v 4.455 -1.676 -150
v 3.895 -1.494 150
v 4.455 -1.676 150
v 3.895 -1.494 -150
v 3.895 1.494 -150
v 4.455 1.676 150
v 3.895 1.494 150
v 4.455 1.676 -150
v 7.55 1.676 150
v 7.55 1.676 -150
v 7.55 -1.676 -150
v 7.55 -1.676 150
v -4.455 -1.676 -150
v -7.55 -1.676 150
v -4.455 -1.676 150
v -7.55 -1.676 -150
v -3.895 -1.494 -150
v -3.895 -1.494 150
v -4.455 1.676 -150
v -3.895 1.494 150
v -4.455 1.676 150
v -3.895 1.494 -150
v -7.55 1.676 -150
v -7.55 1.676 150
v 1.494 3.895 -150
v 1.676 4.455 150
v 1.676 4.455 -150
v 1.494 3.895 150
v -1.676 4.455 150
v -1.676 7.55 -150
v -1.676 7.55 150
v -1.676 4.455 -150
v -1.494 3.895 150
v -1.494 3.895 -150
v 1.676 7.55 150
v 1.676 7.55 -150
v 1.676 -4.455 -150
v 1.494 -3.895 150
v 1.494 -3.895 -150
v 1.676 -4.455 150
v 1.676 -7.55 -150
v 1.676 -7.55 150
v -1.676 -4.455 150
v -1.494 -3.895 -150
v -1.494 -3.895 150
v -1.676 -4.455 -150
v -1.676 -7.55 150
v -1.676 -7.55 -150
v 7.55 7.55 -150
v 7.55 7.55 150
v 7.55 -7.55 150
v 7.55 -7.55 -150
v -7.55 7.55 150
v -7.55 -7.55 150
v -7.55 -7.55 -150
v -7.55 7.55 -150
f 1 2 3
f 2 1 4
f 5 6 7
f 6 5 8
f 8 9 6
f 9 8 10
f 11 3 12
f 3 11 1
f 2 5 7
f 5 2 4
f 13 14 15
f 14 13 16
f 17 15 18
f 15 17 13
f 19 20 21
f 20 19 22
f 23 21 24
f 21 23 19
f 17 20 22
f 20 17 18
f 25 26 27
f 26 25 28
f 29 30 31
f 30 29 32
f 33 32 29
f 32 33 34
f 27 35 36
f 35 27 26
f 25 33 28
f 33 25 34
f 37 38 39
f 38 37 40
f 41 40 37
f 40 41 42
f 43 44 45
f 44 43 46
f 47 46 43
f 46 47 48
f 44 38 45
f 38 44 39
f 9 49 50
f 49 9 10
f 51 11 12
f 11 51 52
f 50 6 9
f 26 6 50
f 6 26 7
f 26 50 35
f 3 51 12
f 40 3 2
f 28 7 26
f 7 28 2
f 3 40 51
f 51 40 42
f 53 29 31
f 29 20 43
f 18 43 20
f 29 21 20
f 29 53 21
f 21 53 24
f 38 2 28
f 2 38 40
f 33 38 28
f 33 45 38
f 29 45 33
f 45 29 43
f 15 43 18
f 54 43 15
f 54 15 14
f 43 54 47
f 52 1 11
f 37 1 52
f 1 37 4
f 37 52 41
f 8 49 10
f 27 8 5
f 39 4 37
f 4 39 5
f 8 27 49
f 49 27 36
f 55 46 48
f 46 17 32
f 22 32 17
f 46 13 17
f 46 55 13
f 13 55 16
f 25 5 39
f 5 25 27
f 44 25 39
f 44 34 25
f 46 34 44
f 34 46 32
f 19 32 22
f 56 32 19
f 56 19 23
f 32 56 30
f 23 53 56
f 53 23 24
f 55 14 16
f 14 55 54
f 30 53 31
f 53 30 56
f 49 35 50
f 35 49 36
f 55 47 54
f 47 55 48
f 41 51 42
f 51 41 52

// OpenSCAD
// Misumi Beam
module misumibeam(size1=15, size2=15, length=100, extra=0.1) {
   difference() {
      cube([size1+extra, size2+extra, length], center=true);
      for (a = [0:180:180]) rotate([0, 0, a]) {
         translate([size1/2, 0, 0]) {
          //  % cube([size1/2, 3, length+1], center=true);
			minkowski() {
               cube([size1/2-(extra+1), size1/6-extra, length+1], center=true);
               cylinder(r=0.5, h=1, center=true);
			} 
        }
      }
      for (a = [0:90:270]) rotate([0, 0, a]) {
         translate([size2/2, 0, 0]) {
          //  % cube([size1/2, 3, length+1], center=true);
			minkowski() {
               cube([size1/2-(extra+1), size1/6-extra, length+1], center=true);
               cylinder(r=0.5, h=1, center=true);
			} 
        }
      }
   }
}

# misumibeam(15, 15, 300);
